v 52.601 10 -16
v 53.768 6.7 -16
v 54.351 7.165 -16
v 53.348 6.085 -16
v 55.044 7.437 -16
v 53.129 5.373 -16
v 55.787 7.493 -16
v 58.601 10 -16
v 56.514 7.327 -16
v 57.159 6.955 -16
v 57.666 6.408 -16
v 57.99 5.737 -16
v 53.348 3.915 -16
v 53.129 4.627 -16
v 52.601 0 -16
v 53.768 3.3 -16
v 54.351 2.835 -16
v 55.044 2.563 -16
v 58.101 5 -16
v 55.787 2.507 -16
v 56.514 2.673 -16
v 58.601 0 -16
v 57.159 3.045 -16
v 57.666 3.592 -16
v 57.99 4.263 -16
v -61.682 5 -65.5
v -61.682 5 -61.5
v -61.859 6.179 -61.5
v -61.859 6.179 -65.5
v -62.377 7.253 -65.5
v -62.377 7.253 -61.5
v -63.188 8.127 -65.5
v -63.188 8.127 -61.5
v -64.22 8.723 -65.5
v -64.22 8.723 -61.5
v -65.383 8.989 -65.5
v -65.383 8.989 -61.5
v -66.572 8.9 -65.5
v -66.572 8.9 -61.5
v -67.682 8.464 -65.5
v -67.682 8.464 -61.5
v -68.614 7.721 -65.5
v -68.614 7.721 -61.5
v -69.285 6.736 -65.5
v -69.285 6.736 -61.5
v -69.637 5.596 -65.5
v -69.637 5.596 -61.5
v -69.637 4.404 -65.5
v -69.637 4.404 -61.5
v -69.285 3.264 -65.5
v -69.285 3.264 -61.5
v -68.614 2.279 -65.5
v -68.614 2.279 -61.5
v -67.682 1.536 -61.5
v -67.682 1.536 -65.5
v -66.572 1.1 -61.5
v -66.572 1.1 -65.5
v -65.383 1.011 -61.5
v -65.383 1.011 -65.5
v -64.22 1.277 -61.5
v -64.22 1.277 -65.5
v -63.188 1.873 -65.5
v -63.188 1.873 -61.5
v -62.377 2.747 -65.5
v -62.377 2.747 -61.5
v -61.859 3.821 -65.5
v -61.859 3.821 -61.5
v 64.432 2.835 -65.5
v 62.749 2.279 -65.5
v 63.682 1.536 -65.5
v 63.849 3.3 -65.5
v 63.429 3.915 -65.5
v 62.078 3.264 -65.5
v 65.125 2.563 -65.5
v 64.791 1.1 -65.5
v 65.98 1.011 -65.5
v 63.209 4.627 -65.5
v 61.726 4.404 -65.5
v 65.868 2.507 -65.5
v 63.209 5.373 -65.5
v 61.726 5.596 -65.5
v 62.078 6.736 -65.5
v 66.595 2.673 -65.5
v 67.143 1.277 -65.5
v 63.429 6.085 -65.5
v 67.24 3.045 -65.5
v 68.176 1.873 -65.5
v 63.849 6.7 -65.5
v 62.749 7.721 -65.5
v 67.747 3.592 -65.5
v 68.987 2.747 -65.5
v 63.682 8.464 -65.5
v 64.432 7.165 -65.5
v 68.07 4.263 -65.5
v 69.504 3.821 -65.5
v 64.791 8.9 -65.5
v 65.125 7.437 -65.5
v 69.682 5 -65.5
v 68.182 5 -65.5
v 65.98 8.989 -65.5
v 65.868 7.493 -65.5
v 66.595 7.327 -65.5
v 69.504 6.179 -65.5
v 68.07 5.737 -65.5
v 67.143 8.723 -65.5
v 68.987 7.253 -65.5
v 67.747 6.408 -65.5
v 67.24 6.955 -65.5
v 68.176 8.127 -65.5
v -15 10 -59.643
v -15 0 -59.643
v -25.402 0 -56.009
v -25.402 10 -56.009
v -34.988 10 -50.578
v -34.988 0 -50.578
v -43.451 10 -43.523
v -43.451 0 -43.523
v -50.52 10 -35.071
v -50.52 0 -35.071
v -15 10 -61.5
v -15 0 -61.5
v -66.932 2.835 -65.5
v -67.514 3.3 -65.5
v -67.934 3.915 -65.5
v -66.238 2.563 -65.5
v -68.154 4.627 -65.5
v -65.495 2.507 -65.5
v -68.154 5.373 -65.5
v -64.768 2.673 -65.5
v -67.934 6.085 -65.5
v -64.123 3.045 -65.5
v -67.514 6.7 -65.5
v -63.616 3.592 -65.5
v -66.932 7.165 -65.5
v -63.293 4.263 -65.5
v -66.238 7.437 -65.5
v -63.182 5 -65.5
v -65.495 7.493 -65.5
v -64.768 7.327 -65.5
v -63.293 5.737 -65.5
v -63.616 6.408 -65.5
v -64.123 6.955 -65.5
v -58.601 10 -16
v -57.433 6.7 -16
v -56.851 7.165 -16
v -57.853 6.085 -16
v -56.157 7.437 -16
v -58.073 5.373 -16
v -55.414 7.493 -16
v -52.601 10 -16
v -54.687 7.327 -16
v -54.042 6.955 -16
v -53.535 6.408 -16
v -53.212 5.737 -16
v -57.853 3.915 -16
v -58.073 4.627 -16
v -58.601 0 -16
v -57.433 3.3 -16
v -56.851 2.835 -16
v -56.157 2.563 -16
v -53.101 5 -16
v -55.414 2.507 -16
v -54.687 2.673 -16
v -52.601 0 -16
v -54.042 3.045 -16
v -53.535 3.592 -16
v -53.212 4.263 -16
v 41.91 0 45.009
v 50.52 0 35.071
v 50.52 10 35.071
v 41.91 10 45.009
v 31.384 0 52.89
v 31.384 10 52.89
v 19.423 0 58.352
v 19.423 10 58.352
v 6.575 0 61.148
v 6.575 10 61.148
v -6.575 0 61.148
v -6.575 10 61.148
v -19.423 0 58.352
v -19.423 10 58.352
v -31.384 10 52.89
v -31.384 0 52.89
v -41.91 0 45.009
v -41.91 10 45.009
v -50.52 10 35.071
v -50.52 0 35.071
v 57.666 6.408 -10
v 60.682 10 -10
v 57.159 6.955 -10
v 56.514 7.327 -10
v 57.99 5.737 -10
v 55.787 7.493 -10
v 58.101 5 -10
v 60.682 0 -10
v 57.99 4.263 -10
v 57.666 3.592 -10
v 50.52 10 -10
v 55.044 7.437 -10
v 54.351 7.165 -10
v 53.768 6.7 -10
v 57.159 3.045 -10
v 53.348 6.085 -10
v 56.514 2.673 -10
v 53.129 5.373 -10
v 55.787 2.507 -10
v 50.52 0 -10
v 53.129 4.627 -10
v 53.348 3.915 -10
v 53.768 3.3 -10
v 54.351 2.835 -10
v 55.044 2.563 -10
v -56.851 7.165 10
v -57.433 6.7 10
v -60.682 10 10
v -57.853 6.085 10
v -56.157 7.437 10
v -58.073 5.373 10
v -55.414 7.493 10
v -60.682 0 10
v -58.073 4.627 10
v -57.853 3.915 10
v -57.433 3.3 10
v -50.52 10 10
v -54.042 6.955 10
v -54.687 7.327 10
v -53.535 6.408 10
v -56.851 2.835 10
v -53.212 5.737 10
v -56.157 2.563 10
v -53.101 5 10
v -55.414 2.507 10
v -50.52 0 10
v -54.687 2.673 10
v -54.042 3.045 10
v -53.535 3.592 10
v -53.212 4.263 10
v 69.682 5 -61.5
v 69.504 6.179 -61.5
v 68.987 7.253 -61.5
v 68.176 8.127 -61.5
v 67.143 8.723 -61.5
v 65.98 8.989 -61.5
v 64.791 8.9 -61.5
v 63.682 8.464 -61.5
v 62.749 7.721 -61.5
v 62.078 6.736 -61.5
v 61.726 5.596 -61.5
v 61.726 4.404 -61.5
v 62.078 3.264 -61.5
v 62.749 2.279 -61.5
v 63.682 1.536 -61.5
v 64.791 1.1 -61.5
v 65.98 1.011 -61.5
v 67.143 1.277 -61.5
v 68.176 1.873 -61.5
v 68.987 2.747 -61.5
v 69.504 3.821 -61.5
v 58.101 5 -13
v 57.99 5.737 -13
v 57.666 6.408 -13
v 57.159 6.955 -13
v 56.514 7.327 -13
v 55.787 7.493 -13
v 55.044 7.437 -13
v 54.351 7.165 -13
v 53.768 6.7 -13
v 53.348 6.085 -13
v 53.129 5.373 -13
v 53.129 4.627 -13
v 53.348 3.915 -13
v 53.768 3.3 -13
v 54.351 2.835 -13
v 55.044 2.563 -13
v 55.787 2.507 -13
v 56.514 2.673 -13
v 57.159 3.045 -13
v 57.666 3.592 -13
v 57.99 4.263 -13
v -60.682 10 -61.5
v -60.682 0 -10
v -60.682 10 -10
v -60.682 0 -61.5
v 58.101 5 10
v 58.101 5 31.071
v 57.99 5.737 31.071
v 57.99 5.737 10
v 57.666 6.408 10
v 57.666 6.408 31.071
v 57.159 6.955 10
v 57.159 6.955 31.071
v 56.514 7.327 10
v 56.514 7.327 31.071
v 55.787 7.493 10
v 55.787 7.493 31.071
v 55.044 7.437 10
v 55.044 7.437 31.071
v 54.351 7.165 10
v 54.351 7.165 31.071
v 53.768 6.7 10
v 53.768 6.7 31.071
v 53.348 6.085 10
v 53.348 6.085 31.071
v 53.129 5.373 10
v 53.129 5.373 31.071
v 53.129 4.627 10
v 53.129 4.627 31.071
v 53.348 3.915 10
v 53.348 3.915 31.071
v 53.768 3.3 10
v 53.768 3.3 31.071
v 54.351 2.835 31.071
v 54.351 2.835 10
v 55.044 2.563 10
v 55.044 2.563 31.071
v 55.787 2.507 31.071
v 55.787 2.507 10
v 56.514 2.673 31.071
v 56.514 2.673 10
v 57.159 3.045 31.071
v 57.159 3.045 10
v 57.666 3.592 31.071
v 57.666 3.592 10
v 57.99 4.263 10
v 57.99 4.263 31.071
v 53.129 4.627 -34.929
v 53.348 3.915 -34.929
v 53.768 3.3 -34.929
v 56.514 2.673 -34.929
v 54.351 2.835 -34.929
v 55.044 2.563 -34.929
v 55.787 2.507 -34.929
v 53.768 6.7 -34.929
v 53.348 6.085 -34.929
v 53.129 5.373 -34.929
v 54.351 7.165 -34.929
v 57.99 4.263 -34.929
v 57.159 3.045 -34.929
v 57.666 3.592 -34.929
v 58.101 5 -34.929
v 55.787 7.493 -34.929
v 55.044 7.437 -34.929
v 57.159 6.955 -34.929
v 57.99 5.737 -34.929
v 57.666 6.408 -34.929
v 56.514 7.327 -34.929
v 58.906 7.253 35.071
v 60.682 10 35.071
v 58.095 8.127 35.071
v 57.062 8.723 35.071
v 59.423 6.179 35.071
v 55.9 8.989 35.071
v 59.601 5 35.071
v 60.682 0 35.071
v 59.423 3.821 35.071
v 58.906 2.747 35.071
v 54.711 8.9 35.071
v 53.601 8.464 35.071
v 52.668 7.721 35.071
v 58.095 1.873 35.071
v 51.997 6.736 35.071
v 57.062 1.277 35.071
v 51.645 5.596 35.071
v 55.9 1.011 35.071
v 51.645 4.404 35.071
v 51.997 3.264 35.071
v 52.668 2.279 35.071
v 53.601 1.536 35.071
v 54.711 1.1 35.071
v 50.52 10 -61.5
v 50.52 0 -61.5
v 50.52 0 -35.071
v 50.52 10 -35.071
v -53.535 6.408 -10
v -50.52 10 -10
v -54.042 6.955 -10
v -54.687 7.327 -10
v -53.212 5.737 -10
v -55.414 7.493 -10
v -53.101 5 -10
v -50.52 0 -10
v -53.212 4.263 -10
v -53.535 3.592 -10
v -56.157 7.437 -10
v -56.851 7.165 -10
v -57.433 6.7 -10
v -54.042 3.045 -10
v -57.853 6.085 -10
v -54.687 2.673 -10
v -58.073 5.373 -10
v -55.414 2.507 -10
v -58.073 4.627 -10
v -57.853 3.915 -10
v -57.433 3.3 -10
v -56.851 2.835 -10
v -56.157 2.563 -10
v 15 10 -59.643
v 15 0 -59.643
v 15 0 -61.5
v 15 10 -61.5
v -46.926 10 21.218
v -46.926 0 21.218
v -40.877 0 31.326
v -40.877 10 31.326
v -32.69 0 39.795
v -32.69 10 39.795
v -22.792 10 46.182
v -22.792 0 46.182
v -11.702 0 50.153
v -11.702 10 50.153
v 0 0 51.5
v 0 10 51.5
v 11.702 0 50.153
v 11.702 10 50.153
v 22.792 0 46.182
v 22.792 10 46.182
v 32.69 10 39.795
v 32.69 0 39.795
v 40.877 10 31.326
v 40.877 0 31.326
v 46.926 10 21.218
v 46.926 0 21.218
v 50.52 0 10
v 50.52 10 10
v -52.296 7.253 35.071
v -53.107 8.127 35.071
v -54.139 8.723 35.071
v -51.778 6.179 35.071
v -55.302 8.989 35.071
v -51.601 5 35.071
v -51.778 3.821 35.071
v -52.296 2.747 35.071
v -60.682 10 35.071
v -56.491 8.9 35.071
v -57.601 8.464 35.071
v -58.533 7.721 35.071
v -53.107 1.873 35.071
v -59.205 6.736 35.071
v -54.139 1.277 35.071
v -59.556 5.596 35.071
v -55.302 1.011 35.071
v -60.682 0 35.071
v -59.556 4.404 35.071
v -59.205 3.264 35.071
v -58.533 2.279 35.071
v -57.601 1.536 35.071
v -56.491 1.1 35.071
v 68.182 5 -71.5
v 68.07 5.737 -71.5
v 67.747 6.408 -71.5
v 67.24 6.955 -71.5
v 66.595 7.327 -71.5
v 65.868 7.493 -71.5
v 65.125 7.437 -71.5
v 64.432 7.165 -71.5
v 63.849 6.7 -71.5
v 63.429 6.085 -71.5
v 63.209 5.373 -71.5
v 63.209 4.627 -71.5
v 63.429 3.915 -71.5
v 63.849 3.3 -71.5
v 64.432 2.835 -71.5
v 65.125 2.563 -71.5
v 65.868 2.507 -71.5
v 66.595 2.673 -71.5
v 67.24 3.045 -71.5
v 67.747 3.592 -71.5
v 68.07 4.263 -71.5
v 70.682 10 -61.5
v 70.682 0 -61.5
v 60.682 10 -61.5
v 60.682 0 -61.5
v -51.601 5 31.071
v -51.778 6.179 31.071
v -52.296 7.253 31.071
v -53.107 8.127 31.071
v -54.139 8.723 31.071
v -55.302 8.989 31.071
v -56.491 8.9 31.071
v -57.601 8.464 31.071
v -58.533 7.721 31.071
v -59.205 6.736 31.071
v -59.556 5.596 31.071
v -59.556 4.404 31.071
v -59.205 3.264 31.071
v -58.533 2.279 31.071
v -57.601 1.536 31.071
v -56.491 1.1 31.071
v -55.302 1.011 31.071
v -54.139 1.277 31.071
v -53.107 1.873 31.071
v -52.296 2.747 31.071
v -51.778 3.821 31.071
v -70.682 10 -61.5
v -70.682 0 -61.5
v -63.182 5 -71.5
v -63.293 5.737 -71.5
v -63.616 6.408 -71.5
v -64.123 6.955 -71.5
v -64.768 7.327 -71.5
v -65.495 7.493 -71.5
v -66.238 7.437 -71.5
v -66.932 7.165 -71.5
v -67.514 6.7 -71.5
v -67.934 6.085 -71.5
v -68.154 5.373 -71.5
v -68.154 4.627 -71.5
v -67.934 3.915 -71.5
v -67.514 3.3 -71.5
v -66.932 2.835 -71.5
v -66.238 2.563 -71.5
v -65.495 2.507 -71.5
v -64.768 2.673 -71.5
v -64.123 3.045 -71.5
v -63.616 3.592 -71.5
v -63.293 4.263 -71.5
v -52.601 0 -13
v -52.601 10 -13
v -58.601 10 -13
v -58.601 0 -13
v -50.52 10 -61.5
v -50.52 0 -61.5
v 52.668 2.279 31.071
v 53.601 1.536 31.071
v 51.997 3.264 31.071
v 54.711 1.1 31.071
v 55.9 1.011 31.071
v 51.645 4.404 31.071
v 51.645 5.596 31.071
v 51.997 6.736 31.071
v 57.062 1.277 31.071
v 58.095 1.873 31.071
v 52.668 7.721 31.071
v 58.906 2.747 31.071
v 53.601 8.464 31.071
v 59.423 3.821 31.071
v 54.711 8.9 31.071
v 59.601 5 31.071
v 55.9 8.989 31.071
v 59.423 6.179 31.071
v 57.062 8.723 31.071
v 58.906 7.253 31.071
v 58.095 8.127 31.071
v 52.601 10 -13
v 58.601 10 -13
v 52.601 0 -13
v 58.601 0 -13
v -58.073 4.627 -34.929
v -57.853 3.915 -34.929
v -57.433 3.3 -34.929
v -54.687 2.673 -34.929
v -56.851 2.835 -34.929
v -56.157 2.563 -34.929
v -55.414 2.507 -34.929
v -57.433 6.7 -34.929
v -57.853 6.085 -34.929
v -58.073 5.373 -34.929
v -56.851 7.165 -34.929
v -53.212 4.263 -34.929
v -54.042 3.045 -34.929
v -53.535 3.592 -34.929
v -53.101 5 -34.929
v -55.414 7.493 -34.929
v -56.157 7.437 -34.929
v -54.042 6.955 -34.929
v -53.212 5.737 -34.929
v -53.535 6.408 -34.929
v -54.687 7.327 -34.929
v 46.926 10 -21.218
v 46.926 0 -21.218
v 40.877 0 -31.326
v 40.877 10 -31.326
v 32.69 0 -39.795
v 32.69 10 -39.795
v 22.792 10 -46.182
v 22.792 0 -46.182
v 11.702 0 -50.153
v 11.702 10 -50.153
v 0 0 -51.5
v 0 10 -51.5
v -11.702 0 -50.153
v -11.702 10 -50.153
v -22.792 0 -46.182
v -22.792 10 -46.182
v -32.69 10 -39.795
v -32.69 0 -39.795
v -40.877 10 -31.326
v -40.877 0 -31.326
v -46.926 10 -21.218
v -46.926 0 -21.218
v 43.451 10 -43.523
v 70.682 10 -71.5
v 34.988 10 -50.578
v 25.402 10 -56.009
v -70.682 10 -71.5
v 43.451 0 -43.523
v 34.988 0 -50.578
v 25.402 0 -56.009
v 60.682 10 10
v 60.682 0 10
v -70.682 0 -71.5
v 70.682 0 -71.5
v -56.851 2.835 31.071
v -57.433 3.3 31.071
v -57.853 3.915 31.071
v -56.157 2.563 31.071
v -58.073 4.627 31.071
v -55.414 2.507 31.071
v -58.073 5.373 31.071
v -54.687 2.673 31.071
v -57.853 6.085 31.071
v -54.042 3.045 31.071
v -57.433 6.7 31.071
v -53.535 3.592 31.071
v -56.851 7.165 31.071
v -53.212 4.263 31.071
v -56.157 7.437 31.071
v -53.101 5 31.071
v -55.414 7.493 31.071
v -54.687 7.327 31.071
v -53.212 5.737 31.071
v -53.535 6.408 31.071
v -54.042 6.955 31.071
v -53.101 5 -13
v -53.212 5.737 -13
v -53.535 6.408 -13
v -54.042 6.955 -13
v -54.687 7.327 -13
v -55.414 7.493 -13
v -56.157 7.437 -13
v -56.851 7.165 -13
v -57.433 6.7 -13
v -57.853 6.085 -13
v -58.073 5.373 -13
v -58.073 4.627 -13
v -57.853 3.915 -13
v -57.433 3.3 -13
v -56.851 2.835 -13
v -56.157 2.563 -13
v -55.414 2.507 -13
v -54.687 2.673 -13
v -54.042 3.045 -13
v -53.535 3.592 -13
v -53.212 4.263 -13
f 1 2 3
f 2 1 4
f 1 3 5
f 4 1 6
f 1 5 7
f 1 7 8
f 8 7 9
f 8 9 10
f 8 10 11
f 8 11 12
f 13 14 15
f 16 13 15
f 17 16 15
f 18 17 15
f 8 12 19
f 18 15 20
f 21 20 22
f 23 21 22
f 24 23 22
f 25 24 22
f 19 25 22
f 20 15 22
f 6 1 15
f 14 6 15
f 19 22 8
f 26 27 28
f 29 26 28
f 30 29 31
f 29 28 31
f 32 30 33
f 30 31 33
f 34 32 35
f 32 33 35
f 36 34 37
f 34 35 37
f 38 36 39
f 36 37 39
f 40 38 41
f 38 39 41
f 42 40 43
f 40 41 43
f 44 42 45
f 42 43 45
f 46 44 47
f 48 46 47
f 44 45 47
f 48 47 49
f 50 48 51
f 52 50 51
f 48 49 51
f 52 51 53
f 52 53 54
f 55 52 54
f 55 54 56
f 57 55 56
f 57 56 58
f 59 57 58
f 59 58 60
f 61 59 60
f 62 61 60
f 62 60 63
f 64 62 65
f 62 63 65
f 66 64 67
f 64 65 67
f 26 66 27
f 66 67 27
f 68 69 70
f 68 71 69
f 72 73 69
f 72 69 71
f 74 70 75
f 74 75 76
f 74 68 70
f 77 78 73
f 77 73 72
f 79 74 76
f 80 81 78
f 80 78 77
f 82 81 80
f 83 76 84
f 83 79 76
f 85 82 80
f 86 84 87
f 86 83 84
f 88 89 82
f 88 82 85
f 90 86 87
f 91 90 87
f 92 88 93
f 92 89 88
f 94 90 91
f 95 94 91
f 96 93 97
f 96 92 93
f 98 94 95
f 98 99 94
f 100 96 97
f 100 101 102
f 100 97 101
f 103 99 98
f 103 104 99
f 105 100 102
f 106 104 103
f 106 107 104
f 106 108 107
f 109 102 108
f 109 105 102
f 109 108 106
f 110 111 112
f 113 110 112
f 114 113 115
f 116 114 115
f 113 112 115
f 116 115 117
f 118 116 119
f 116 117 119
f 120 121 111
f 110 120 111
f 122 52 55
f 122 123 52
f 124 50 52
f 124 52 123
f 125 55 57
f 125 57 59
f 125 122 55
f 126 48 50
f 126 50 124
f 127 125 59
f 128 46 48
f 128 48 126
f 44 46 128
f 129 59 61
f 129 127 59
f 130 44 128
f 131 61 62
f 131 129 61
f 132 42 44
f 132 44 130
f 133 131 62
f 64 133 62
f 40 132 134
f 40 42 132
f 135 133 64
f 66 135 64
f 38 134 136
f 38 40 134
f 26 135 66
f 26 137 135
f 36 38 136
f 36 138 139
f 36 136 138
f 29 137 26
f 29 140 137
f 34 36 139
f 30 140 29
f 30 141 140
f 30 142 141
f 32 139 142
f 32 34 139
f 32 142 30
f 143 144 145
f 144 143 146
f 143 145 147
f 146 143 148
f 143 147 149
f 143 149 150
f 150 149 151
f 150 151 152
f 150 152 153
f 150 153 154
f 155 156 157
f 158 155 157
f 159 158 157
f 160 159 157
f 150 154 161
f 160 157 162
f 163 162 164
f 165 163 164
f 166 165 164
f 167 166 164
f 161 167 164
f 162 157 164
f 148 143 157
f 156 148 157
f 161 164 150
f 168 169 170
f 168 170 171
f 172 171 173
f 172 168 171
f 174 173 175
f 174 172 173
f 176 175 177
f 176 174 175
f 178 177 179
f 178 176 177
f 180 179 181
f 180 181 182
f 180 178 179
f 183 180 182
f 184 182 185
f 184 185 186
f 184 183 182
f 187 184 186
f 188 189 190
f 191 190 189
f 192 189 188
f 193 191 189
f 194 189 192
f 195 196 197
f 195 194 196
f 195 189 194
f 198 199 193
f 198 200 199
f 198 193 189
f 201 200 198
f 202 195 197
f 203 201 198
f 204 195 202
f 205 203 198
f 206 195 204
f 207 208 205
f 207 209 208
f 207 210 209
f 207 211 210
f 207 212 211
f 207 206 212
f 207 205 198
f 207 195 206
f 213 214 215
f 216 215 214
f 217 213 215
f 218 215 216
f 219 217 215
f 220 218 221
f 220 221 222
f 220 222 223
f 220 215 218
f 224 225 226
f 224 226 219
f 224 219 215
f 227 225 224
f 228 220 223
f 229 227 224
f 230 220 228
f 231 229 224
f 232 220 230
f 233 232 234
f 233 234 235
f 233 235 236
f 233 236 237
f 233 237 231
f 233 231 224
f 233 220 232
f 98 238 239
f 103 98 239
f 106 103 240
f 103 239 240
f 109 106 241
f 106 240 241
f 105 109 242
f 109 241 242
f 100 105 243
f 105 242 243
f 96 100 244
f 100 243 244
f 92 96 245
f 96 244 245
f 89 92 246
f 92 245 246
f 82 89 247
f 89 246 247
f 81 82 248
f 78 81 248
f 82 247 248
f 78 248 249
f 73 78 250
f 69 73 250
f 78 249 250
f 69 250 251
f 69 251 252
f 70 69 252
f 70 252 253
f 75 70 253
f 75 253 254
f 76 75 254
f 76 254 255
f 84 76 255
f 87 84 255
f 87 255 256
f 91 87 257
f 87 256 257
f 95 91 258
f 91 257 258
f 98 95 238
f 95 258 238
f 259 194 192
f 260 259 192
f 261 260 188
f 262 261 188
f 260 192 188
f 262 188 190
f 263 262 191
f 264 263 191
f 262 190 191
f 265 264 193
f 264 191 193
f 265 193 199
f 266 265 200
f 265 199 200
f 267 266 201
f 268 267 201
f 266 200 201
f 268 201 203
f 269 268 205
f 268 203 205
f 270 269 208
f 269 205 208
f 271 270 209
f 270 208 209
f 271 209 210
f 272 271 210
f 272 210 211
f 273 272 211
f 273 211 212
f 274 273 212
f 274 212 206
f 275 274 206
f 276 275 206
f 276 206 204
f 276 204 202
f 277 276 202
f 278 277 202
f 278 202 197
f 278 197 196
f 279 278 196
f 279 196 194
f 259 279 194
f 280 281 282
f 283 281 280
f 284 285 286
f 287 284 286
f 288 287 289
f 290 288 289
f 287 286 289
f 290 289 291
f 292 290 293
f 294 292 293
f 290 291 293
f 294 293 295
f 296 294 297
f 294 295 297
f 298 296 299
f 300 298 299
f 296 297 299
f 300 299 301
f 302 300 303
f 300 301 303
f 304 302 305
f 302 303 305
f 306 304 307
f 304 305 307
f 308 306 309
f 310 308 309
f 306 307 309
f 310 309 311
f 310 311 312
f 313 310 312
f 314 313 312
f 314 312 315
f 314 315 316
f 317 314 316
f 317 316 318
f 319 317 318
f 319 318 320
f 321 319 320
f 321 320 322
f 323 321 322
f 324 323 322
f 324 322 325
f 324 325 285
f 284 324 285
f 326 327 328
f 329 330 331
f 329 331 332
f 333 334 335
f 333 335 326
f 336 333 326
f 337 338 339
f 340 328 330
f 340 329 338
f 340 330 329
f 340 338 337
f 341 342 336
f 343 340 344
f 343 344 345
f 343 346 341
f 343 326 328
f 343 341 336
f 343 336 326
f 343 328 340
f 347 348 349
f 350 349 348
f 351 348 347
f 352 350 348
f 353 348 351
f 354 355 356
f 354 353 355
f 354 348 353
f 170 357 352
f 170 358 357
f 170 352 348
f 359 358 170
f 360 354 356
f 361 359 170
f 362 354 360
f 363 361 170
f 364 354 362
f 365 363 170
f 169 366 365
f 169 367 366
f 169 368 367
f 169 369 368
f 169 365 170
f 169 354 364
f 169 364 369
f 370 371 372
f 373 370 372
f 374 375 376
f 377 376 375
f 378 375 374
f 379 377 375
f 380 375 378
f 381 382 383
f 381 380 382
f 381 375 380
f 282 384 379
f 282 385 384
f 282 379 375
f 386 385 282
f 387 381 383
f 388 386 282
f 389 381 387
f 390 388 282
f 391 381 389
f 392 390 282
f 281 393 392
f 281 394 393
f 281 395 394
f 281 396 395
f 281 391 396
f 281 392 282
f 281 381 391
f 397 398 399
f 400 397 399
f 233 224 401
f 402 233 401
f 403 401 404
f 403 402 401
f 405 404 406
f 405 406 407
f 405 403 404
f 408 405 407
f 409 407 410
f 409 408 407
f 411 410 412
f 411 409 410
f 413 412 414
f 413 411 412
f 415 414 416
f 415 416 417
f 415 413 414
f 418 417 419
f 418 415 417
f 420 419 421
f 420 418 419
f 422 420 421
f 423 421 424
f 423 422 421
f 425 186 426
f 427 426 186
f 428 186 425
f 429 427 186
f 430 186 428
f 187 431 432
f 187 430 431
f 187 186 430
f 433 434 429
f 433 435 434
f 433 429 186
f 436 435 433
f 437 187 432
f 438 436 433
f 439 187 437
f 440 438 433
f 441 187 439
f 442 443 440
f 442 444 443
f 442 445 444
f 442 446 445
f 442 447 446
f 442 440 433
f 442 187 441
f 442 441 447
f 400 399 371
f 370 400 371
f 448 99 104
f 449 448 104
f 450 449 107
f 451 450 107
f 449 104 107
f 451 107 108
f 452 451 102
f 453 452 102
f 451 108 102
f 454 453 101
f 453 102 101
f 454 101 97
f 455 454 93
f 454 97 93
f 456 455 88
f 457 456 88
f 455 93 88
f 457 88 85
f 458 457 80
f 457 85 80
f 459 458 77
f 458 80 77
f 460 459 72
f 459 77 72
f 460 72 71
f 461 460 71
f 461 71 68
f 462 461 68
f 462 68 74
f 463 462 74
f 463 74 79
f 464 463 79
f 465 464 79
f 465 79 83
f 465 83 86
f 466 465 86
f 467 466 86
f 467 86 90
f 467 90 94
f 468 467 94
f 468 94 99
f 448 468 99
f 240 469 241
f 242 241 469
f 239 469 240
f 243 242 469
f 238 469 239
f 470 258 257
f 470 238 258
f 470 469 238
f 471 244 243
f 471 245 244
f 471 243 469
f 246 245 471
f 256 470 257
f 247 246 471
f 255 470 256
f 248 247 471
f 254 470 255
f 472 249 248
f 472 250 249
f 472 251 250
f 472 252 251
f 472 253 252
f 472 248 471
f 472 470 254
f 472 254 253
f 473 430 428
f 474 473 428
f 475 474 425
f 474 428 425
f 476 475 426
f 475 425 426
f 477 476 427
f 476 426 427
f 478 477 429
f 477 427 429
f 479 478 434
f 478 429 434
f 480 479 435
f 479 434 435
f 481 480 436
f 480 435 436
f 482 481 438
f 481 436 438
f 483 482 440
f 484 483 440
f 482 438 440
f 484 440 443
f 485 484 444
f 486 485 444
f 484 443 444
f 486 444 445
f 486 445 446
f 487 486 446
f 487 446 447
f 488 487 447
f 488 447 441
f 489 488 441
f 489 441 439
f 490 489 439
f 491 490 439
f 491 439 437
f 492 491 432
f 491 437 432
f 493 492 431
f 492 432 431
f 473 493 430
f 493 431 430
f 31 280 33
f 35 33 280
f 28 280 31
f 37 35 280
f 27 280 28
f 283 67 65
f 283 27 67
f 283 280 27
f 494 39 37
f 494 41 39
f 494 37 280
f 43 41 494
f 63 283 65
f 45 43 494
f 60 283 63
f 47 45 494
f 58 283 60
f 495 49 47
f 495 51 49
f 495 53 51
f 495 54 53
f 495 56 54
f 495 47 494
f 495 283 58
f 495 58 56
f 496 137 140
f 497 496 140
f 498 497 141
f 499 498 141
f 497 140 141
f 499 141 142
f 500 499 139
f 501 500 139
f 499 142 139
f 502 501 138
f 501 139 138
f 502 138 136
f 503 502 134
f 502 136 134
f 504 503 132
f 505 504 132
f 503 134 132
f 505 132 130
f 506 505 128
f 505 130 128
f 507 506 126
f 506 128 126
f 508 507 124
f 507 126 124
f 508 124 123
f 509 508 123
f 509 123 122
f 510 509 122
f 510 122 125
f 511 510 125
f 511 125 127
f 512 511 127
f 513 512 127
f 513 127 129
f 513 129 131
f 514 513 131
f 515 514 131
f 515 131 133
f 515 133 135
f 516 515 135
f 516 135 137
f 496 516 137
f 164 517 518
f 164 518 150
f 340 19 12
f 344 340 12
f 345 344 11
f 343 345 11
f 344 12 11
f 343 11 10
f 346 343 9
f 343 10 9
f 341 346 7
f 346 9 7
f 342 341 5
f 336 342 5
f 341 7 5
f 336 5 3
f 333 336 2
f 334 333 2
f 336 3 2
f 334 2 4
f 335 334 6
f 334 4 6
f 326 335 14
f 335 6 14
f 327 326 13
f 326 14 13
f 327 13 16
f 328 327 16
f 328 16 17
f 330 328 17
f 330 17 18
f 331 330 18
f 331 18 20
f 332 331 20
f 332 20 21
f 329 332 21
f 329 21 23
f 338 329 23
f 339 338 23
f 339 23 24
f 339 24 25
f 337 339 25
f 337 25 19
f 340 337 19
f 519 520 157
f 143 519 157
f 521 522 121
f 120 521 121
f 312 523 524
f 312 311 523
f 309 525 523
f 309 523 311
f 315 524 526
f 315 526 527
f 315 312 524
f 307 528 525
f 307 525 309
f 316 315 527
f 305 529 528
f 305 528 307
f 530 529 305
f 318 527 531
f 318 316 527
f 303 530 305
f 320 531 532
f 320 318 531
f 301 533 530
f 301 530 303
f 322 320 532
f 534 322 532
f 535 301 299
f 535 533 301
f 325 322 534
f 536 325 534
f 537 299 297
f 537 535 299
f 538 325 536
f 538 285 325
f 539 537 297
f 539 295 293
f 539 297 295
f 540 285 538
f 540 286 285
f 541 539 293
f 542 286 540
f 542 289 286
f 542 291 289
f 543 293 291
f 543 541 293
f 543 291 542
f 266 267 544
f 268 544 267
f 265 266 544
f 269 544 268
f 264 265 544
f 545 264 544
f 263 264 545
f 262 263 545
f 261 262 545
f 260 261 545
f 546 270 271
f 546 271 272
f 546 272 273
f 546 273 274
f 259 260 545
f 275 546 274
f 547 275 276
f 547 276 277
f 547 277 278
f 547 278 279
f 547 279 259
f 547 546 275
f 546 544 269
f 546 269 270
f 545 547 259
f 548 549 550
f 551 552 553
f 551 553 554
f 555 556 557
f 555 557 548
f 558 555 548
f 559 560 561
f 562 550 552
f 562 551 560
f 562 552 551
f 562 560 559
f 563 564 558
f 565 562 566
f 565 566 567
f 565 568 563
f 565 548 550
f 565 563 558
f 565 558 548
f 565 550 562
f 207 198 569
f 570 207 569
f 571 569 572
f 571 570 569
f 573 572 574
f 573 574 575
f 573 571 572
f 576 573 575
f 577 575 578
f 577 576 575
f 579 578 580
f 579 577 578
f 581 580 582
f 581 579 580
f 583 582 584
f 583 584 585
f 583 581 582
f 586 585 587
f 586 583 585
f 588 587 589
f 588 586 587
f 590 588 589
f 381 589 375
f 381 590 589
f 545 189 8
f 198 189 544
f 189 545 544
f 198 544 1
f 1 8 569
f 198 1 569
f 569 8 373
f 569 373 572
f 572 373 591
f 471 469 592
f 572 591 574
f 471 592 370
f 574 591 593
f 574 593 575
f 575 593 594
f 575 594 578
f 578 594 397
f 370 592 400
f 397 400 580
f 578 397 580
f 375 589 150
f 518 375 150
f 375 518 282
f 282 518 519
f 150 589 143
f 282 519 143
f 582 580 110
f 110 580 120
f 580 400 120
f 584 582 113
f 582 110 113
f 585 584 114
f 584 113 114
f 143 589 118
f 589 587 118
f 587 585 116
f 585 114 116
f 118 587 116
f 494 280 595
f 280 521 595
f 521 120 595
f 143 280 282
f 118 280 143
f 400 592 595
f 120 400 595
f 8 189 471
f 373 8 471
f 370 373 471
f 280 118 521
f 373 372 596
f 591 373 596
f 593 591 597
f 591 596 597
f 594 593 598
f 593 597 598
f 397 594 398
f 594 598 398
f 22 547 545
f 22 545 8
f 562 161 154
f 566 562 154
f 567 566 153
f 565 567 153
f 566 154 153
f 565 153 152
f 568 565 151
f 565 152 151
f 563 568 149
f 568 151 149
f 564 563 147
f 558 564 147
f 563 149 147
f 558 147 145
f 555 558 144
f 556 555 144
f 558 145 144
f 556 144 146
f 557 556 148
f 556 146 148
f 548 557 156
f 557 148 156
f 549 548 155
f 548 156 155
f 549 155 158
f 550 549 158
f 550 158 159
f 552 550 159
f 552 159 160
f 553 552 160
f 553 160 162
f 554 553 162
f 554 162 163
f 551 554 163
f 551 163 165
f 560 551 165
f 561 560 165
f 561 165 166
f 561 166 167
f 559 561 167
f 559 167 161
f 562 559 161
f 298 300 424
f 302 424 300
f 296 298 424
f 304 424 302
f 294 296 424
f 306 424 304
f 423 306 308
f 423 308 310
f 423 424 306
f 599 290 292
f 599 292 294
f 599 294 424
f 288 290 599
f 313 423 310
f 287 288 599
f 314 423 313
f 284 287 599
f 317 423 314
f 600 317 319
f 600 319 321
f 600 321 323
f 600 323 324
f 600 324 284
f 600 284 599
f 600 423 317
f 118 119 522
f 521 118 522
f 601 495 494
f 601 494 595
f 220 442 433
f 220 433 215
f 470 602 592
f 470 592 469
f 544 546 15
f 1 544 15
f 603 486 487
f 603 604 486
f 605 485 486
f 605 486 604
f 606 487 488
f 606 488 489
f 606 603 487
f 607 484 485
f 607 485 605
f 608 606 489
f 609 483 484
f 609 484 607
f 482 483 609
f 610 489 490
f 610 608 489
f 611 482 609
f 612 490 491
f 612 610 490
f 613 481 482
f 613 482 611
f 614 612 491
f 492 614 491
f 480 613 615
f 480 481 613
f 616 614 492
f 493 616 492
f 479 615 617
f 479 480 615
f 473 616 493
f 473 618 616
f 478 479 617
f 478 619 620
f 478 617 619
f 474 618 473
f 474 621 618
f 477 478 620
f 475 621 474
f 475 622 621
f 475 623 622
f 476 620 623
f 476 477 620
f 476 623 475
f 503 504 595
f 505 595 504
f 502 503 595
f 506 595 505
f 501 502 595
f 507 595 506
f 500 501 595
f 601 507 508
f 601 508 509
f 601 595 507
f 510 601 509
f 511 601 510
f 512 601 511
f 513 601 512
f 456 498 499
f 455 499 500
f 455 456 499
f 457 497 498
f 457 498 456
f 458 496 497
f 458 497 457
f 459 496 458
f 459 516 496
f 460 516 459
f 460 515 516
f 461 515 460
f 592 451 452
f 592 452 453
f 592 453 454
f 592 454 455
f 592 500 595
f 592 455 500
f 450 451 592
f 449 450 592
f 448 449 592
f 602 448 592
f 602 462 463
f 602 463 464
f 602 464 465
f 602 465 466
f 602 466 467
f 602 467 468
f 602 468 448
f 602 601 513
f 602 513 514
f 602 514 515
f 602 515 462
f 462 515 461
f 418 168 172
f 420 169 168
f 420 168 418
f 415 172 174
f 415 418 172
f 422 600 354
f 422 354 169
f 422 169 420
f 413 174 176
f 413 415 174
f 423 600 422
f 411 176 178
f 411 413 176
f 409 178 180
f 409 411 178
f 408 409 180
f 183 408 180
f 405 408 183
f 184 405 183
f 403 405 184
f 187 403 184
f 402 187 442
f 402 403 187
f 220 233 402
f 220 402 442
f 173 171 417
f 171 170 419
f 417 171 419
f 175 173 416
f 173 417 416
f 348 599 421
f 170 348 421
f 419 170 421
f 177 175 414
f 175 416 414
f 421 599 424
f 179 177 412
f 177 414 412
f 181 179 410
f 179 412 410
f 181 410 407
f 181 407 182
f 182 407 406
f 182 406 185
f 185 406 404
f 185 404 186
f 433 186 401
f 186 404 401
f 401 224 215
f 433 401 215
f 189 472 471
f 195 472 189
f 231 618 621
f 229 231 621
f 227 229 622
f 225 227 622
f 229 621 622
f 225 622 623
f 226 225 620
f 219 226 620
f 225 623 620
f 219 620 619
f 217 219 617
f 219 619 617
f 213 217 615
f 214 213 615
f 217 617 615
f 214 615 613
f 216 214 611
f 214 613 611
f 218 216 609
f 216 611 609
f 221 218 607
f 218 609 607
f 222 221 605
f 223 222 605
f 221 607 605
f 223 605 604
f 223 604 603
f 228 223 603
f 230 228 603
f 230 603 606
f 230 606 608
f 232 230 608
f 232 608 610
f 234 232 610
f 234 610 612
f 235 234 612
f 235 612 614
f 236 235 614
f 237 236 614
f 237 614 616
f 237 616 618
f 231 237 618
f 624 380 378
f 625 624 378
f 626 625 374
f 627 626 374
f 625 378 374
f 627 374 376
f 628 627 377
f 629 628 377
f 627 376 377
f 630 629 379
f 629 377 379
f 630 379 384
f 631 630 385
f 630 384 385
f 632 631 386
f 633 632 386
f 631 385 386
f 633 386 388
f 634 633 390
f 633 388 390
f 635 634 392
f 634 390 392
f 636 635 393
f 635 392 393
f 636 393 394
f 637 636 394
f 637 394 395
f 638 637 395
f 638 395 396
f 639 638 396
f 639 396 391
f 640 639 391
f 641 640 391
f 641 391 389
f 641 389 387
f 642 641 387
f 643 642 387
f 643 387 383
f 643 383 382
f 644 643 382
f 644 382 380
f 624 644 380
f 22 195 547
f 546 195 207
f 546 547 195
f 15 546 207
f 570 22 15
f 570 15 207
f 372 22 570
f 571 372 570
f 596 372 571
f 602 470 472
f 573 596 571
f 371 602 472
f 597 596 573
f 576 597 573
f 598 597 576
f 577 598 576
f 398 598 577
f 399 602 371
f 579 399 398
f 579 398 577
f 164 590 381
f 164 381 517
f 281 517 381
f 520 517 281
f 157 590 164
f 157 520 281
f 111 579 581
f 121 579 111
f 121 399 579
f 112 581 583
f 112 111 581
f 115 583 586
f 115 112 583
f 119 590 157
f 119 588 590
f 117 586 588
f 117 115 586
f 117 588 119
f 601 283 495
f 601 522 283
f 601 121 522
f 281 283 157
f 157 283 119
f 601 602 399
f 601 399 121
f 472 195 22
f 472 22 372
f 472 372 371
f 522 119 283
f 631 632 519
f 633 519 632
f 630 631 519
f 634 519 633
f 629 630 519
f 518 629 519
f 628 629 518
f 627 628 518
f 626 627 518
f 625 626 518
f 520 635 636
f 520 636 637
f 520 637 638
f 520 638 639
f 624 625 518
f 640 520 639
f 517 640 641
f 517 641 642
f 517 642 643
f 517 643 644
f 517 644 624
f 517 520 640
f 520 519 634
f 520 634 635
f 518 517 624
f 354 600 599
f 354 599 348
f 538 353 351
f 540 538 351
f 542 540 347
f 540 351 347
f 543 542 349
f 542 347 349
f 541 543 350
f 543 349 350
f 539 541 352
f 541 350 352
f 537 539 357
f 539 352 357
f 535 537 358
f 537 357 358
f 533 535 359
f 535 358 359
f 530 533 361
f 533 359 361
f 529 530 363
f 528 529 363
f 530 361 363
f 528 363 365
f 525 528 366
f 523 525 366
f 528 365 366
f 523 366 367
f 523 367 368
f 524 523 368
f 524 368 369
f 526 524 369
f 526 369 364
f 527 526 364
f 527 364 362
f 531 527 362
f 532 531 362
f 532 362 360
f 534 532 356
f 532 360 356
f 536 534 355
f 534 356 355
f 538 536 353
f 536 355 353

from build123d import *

# Parameters (mm, degrees)
BOSS_EXTRUDE1_DEPTH   = 10
BOSS_EXTRUDE1_2_DEPTH = 10
SKETCH2_R             = 2.5
CUT_EXTRUDE1_DEPTH    = 10
SKETCH3_R             = 4
CUT_EXTRUDE2_DEPTH    = 4
SKETCH4_R             = 2.5
CUT_EXTRUDE3_DEPTH    = 70
SKETCH5_R             = 4
CUT_EXTRUDE4_DEPTH    = 4
CUT_EXTRUDE5_START    = -10
SKETCH6_W             = 6
SKETCH6_H             = 3
CUT_EXTRUDE5_DEPTH    = 10
SKETCH7_R             = 2.5
CUT_EXTRUDE6_DEPTH    = 70
SKETCH8_R             = 4
CUT_EXTRUDE7_DEPTH    = 4
CUT_EXTRUDE8_START    = -10
SKETCH11_W            = 6
SKETCH11_H            = 3
CUT_EXTRUDE8_DEPTH    = 10


with BuildPart() as part:
    # Sketch1 → Boss-Extrude1 (new body)
    with BuildSketch(Plane(origin=(0, 0, 0), x_dir=(1, 0, 0), z_dir=(0, 1, 0))):
        with BuildLine():
            ThreePointArc((50.519798099, 10), (0, 51.5), (-50.519798099, 10))
            Line((-50.519798099, 10), (-60.681545794, 10))
            Line((-60.681545794, 10), (-60.681545794, 61.5))
            Line((-60.681545794, 61.5), (-70.681545794, 61.5))
            Line((-70.681545794, 61.5), (-70.681545794, 71.5))
            Line((-70.681545794, 71.5), (70.681545794, 71.5))
            Line((70.681545794, 71.5), (70.681545794, 61.5))
            Line((70.681545794, 61.5), (60.681545794, 61.5))
            Line((60.681545794, 61.5), (60.681545794, 10))
            Line((60.681545794, 10), (50.519798099, 10))
        make_face()
        with BuildLine():
            Line((50.519798099, 61.5), (50.519798099, 35.071355834))
            ThreePointArc((50.519798099, 35.071355834), (34.987834357, 50.577677359), (15, 59.642686056))
            Line((15, 59.642686056), (15, 61.5))
            Line((15, 61.5), (50.519798099, 61.5))
        make_face(mode=Mode.SUBTRACT)
        with BuildLine():
            Line((-15, 61.5), (-15, 59.642686056))
            ThreePointArc((-15, 59.642686056), (-34.987834357, 50.577677359), (-50.519798099, 35.071355834))
            Line((-50.519798099, 35.071355834), (-50.519798099, 61.5))
            Line((-50.519798099, 61.5), (-15, 61.5))
        make_face(mode=Mode.SUBTRACT)
    extrude(amount=BOSS_EXTRUDE1_DEPTH)

    # Sketch2 → Cut-Extrude1 (cut)
    with BuildSketch(Plane.XY.offset(-61.5)):
        with Locations((-65.681545794, 5)):
            Circle(SKETCH2_R)
        with Locations((65.681545794, 5)):
            Circle(SKETCH2_R)
    extrude(amount=-CUT_EXTRUDE1_DEPTH, mode=Mode.SUBTRACT)

    # Sketch3 → Cut-Extrude2 (cut)
    with BuildSketch(Plane.XY.offset(-61.5)):
        with Locations((-65.681545794, 5)):
            Circle(SKETCH3_R)
        with Locations((65.681545794, 5)):
            Circle(SKETCH3_R)
    extrude(amount=-CUT_EXTRUDE2_DEPTH, mode=Mode.SUBTRACT)


with BuildPart() as body_2:
    # Sketch1 → Boss-Extrude1 2 (new body)
    with BuildSketch(Plane(origin=(0, 0, 0), x_dir=(1, 0, 0), z_dir=(0, 1, 0))):
        with BuildLine():
            ThreePointArc((-50.519798099, -10), (0, -51.5), (50.519798099, -10))
            Line((50.519798099, -10), (60.681545794, -10))
            Line((60.681545794, -10), (60.681545794, -35.071355834))
            Line((60.681545794, -35.071355834), (50.519798099, -35.071355834))
            ThreePointArc((50.519798099, -35.071355834), (0, -61.5), (-50.519798099, -35.071355834))
            Line((-50.519798099, -35.071355834), (-60.681545794, -35.071355834))
            Line((-60.681545794, -35.071355834), (-60.681545794, -10))
            Line((-60.681545794, -10), (-50.519798099, -10))
        make_face()
    extrude(amount=BOSS_EXTRUDE1_2_DEPTH)


with BuildPart() as cut_extrude3_tool:
    # Sketch4 → Cut-Extrude3 (new body)
    with BuildSketch(Plane.XY.offset(35.071355834)):
        with Locations((-55.600671947, 5)):
            Circle(SKETCH4_R)
    extrude(amount=-CUT_EXTRUDE3_DEPTH)


with BuildPart() as part_1:
    add(part.part)

    # Cut-Extrude3: cut by cut_extrude3_tool
    add(cut_extrude3_tool.part, mode=Mode.SUBTRACT)

    # Sketch6 → Cut-Extrude5 (cut)
    with BuildSketch(Plane(origin=(0, 10, 0), x_dir=(1, 0, 0), z_dir=(0, 1, 0)).offset(CUT_EXTRUDE5_START)):
        with Locations((-55.600671947, 14.5)):
            Rectangle(SKETCH6_W, SKETCH6_H)
    extrude(amount=CUT_EXTRUDE5_DEPTH, mode=Mode.SUBTRACT)


with BuildPart() as body_2_1:
    add(body_2.part)

    # Cut-Extrude3: cut by cut_extrude3_tool
    add(cut_extrude3_tool.part, mode=Mode.SUBTRACT)

    # Sketch5 → Cut-Extrude4 (cut)
    with BuildSketch(Plane.XY.offset(35.071355834)):
        with Locations((-55.600671947, 5)):
            Circle(SKETCH5_R)
    extrude(amount=-CUT_EXTRUDE4_DEPTH, mode=Mode.SUBTRACT)


with BuildPart() as cut_extrude6_tool:
    # Sketch7 → Cut-Extrude6 (new body)
    with BuildSketch(Plane.XY.offset(35.071355834)):
        with Locations((55.600671947, 5)):
            Circle(SKETCH7_R)
    extrude(amount=-CUT_EXTRUDE6_DEPTH)


with BuildPart() as part_2:
    add(part_1.part)

    # Cut-Extrude6: cut by cut_extrude6_tool
    add(cut_extrude6_tool.part, mode=Mode.SUBTRACT)

    # Sketch11 → Cut-Extrude8 (cut)
    with BuildSketch(Plane(origin=(0, 10, 0), x_dir=(1, 0, 0), z_dir=(0, 1, 0)).offset(CUT_EXTRUDE8_START)):
        with Locations((55.600671947, 14.5)):
            Rectangle(SKETCH11_W, SKETCH11_H)
    extrude(amount=CUT_EXTRUDE8_DEPTH, mode=Mode.SUBTRACT)


with BuildPart() as body_2_2:
    add(body_2_1.part)

    # Cut-Extrude6: cut by cut_extrude6_tool
    add(cut_extrude6_tool.part, mode=Mode.SUBTRACT)

    # Sketch8 → Cut-Extrude7 (cut)
    with BuildSketch(Plane.XY.offset(35.071355834)):
        with Locations((55.600671947, 5)):
            Circle(SKETCH8_R)
    extrude(amount=-CUT_EXTRUDE7_DEPTH, mode=Mode.SUBTRACT)


solid = Compound([part_2.part, body_2_2.part])
